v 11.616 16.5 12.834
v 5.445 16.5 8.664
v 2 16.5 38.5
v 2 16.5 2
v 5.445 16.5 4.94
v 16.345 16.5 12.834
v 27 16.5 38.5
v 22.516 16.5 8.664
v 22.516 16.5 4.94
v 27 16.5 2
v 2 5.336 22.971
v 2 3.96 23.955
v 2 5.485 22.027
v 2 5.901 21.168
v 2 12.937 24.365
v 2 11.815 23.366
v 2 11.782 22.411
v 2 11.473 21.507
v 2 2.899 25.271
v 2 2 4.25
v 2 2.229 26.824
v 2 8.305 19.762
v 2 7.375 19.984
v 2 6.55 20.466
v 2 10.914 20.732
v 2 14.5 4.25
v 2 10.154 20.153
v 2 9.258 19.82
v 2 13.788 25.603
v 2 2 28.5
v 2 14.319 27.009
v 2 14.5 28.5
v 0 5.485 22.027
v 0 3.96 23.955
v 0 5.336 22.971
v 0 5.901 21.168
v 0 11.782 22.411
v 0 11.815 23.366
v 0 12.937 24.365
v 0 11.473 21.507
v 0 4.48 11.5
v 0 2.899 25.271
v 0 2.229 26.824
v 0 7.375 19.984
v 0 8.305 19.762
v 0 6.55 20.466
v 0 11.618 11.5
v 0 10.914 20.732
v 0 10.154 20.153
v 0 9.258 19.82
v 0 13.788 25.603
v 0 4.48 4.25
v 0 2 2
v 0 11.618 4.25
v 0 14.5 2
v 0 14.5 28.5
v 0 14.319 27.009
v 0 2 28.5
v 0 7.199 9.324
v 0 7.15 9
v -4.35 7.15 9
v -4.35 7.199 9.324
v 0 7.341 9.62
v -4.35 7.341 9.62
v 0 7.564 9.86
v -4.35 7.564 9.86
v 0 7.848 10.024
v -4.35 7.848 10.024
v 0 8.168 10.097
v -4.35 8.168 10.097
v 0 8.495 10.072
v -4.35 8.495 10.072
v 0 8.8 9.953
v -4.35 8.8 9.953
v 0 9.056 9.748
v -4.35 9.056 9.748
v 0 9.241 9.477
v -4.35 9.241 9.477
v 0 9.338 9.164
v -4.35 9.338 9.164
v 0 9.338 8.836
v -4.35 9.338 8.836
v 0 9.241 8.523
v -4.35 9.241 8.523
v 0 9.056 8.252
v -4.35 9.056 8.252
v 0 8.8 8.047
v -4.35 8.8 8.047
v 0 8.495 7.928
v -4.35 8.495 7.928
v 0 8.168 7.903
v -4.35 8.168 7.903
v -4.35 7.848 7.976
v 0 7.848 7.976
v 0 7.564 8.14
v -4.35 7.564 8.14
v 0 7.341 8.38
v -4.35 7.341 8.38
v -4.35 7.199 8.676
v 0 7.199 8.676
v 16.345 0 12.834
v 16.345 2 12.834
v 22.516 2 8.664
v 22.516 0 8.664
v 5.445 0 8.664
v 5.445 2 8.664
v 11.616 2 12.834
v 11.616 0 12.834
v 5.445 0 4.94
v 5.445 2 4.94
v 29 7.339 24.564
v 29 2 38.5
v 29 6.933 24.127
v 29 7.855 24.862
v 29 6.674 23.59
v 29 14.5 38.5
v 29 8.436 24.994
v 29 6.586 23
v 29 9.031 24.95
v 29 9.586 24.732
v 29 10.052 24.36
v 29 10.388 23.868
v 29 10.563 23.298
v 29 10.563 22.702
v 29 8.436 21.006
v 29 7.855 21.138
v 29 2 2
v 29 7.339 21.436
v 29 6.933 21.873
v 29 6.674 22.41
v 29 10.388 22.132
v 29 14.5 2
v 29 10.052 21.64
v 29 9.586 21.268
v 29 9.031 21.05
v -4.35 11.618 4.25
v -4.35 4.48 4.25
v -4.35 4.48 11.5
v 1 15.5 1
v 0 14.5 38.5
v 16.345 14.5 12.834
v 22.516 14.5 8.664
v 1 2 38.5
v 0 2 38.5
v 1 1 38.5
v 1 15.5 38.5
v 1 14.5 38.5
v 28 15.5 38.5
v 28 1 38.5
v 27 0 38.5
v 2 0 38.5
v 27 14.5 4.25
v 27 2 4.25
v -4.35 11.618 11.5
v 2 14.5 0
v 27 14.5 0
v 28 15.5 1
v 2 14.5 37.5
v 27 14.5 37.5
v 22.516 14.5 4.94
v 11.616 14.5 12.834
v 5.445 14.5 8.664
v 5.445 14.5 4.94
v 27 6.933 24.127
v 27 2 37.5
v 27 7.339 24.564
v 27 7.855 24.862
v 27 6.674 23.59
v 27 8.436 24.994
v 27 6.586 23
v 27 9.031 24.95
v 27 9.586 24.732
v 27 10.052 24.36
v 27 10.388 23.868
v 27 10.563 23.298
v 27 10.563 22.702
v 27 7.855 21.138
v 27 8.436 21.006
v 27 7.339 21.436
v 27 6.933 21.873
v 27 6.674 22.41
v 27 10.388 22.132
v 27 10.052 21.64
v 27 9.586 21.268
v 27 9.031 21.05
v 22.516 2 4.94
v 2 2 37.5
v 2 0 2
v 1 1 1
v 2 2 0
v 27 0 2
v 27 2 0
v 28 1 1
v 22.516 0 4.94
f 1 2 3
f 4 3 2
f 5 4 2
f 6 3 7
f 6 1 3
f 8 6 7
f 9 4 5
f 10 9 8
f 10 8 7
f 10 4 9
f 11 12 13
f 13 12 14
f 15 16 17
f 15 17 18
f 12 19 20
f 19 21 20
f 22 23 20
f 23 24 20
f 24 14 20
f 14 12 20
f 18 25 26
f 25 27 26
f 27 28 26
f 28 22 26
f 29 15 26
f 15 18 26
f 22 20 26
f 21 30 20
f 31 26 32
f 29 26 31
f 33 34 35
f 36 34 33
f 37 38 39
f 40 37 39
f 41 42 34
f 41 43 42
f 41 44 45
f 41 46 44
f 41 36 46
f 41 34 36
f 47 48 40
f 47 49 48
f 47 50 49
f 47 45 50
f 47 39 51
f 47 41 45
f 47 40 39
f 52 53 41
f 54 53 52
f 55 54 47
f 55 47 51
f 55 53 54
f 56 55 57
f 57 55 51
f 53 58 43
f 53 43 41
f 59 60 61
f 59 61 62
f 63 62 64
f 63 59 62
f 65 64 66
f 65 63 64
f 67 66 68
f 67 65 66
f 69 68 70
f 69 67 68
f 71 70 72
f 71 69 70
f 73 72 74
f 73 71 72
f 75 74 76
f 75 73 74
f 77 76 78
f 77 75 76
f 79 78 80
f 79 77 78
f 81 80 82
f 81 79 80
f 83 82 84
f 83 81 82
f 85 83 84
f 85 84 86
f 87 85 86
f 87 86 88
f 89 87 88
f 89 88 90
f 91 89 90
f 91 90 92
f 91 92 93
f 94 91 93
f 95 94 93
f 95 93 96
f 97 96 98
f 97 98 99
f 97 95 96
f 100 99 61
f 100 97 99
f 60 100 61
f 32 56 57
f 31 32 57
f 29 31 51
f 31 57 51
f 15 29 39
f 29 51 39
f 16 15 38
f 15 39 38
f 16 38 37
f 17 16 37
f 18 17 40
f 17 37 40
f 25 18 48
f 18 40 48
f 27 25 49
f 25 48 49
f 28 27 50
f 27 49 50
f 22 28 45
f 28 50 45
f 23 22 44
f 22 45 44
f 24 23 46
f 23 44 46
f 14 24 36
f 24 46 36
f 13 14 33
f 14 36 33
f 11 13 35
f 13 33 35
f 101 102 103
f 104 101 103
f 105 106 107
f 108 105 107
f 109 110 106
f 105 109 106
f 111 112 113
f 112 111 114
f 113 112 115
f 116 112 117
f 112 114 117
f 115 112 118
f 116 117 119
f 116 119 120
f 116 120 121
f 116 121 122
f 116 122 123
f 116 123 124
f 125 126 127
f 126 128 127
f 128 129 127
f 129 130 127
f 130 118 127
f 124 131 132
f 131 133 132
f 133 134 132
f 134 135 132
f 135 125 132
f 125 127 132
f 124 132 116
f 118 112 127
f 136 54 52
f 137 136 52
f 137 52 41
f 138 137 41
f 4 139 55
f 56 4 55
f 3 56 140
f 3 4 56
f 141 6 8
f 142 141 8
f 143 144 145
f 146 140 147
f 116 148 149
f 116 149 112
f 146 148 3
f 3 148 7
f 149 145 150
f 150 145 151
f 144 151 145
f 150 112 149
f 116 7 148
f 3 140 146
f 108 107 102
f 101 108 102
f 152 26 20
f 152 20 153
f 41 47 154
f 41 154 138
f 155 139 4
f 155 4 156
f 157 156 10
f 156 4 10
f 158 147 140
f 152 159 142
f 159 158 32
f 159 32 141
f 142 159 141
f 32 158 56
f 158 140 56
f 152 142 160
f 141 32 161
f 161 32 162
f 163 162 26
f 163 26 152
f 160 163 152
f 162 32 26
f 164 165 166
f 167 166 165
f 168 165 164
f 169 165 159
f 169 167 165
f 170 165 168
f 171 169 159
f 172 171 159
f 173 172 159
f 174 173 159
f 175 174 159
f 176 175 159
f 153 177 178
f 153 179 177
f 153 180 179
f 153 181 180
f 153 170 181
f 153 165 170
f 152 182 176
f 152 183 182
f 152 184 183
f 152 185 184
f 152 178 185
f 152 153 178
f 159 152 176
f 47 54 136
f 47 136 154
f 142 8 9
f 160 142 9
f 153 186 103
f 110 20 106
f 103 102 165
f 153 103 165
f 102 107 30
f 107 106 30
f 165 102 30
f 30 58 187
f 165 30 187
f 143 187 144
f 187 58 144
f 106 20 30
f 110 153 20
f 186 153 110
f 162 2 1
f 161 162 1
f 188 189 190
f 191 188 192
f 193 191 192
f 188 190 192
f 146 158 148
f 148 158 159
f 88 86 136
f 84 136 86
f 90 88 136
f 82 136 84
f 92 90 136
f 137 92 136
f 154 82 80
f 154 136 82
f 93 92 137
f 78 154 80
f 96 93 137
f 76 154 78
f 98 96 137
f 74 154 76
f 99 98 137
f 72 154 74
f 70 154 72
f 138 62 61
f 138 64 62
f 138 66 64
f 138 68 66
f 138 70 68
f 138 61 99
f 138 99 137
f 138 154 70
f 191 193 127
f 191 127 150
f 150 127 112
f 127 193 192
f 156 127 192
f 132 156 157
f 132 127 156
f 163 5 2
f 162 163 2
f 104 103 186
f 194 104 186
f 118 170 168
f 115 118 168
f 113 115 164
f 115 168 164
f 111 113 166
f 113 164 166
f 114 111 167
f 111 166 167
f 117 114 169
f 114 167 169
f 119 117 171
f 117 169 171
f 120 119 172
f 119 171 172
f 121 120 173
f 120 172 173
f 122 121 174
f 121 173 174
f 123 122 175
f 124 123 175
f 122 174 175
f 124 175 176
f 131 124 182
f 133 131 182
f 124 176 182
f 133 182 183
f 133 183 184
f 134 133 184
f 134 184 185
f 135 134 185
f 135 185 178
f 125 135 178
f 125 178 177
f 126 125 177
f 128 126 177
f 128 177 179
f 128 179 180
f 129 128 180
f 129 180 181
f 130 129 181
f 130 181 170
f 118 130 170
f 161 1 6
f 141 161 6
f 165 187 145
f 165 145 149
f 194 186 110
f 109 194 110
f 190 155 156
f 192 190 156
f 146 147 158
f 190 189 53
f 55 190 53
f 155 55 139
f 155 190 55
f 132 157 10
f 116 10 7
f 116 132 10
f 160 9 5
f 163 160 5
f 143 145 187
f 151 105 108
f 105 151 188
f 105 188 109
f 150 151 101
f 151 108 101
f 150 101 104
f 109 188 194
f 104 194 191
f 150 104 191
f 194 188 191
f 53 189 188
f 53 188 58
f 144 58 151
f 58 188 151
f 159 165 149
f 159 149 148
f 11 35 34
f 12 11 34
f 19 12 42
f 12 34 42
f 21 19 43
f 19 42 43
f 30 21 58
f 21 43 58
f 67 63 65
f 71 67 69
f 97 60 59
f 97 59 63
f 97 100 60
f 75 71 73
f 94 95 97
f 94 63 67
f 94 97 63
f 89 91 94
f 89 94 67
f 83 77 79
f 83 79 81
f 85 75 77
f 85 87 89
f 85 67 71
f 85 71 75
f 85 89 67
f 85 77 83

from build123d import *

# Parameters (mm, degrees)
F0_W      = 29
F0_H      = 16.5
F1_DEPTH  = 38.5
F2_T      = -2
F3_DEPTH  = 2.25
F4_SIZE   = 2
F5_SIZE   = 2
F6_SIZE   = 2
F7_SIZE   = 2
F8_SIZE   = 2
F9_SIZE   = 0.99999
F11_DEPTH = 16.501
F12_SIZE  = 2
F13_SIZE  = 2
F14_W     = 12.5
F14_H     = 2.3482141793
F15_DEPTH = 2
F16_R     = 2
F17_DEPTH = 2.001
F18_W     = 7.1378413203
F18_H     = 7.25
F18_R     = 1.1
F19_DEPTH = 4.35


# Not quite as in the source:
# - a fillet or chamfer is up to 0.001 mm smaller than in the source, because OpenCascade refuses the exact size


with BuildPart() as f1:
    # F0 (on Top) → F1 (new body)
    with BuildSketch(Plane.XY):
        with Locations((14.5, 8.25)):
            Rectangle(F0_W, F0_H)
    extrude(amount=F1_DEPTH)

    # F2
    f2_openings = [f1.faces().sort_by_distance(p)[0] for p in [
        (14.5, 8.25, 38.5),
    ]]
    offset(amount=F2_T, openings=f2_openings)

    # F3 (add): a face of the model
    f3_faces = [f1.faces().sort_by_distance(p)[0] for p in [
        (14.5, 8.25, 2),
    ]]
    extrude(f3_faces, amount=F3_DEPTH)

    # F4
    f4_edges = [f1.edges().sort_by_distance(p)[0] for p in [
        (0, 0, 19.25),
    ]]
    chamfer(f4_edges, length=F4_SIZE)

    # F5
    f5_edges = [f1.edges().sort_by_distance(p)[0] for p in [
        (0, 16.5, 19.25),
        (29, 0, 19.25),
    ]]
    chamfer(f5_edges, length=F5_SIZE)

    # F6
    f6_edges = [f1.edges().sort_by_distance(p)[0] for p in [
        (29, 16.5, 19.25),
    ]]
    chamfer(f6_edges, length=F6_SIZE)

    # F7
    f7_edges = [f1.edges().sort_by_distance(p)[0] for p in [
        (14.5, 0, 0),
    ]]
    chamfer(f7_edges, length=F7_SIZE)

    # F8
    f8_edges = [f1.edges().sort_by_distance(p)[0] for p in [
        (14.5, 16.5, 0),
    ]]
    chamfer(f8_edges, length=F8_SIZE)

    # F9 (size 1 in the source; OpenCascade refuses exactly that, so slightly less here)
    f9_edges = [f1.edges().sort_by_distance(p)[0] for p in [
        (14.5, 14.5, 38.5),
        (2, 8.25, 38.5),
        (14.5, 2, 38.5),
        (27, 8.25, 38.5),
    ]]
    chamfer(f9_edges, length=F9_SIZE)

    # F10 (on face) → F11 (cut, through all)
    with BuildSketch(Plane(origin=(0, 16.5, 0), x_dir=(-1, 0, 0), z_dir=(0, 1, 0))):
        Polygon((-16.345, 12.834), (-22.516, 8.664), (-22.516, 4.94), (-5.445, 4.94), (-5.445, 8.664), (-11.616, 12.834), align=None)
    extrude(amount=-F11_DEPTH, mode=Mode.SUBTRACT)

    # F12
    f12_edges = [f1.edges().sort_by_distance(p)[0] for p in [
        (0, 8.25, 0),
    ]]
    chamfer(f12_edges, length=F12_SIZE)

    # F13
    f13_edges = [f1.edges().sort_by_distance(p)[0] for p in [
        (29, 8.25, 0),
    ]]
    chamfer(f13_edges, length=F13_SIZE)

    # F14 (on face) → F15 (cut, through all)
    with BuildSketch(Plane(origin=(0, 0, 0), x_dir=(0, -1, 0), z_dir=(-1, 0, 0))):
        with BuildLine():
            ThreePointArc((-14.5, 28.5), (-8.25, 34.75), (-2, 28.5))
            Line((-2, 28.5), (-2, 38.5))
            Line((-2, 38.5), (-14.5, 38.5))
            Line((-14.5, 38.5), (-14.5, 28.5))
        make_face()
        with Locations((-8.25, 39.6741070896)):
            Rectangle(F14_W, F14_H)
        with BuildLine():
            Line((-14.5, 28.5), (-2, 28.5))
            ThreePointArc((-2, 28.5), (-8.25, 34.75), (-14.5, 28.5))
        make_face()
        with BuildLine():
            ThreePointArc((-11.8148919341, 23.3663808577), (-8.6306663931, 22.2616033232), (-5.335738673, 22.9710235198))
            ThreePointArc((-5.335738673, 22.9710235198), (-5.3356417901, 22.985511616), (-5.3356094956, 23))
            ThreePointArc((-5.3356094956, 23), (-8.4021264241, 26.2448164759), (-11.8148919341, 23.3663808577))
        make_face()
        with BuildLine():
            ThreePointArc((-11.8148919341, 23.3663808577), (-8.7835560201, 19.7560337281), (-5.335738673, 22.9710235198))
            ThreePointArc((-5.335738673, 22.9710235198), (-8.6306663931, 22.2616033232), (-11.8148919341, 23.3663808577))
        make_face()
        with BuildLine():
            ThreePointArc((-5.335738673, 22.9710235198), (-2.8985220129, 25.2713496081), (-2, 28.5))
            Line((-2, 28.5), (-14.5, 28.5))
            ThreePointArc((-14.5, 28.5), (-13.7881889905, 25.6032841517), (-11.8148919341, 23.3663808577))
            ThreePointArc((-11.8148919341, 23.3663808577), (-8.4021264241, 26.2448164759), (-5.3356094956, 23))
            ThreePointArc((-5.3356094956, 23), (-5.3356417901, 22.985511616), (-5.335738673, 22.9710235198))
        make_face()
    extrude(amount=-F15_DEPTH, mode=Mode.SUBTRACT)

    # F16 (on face) → F17 (cut, through all)
    with BuildSketch(Plane(origin=(27, 0, 0), x_dir=(0, -1, 0), z_dir=(-1, 0, 0))):
        with Locations((-8.5856094956, 23)):
            Circle(F16_R)
    extrude(amount=-F17_DEPTH, mode=Mode.SUBTRACT)

    # F18 (on face) → F19 (join)
    with BuildSketch(Plane(origin=(0, 0, 0), x_dir=(0, -1, 0), z_dir=(-1, 0, 0))):
        with Locations((-8.0489206601, 7.875)):
            Rectangle(F18_W, F18_H)
        with Locations((-8.25, 9)):
            Circle(F18_R, mode=Mode.SUBTRACT)
    extrude(amount=F19_DEPTH)


solid = f1.part
